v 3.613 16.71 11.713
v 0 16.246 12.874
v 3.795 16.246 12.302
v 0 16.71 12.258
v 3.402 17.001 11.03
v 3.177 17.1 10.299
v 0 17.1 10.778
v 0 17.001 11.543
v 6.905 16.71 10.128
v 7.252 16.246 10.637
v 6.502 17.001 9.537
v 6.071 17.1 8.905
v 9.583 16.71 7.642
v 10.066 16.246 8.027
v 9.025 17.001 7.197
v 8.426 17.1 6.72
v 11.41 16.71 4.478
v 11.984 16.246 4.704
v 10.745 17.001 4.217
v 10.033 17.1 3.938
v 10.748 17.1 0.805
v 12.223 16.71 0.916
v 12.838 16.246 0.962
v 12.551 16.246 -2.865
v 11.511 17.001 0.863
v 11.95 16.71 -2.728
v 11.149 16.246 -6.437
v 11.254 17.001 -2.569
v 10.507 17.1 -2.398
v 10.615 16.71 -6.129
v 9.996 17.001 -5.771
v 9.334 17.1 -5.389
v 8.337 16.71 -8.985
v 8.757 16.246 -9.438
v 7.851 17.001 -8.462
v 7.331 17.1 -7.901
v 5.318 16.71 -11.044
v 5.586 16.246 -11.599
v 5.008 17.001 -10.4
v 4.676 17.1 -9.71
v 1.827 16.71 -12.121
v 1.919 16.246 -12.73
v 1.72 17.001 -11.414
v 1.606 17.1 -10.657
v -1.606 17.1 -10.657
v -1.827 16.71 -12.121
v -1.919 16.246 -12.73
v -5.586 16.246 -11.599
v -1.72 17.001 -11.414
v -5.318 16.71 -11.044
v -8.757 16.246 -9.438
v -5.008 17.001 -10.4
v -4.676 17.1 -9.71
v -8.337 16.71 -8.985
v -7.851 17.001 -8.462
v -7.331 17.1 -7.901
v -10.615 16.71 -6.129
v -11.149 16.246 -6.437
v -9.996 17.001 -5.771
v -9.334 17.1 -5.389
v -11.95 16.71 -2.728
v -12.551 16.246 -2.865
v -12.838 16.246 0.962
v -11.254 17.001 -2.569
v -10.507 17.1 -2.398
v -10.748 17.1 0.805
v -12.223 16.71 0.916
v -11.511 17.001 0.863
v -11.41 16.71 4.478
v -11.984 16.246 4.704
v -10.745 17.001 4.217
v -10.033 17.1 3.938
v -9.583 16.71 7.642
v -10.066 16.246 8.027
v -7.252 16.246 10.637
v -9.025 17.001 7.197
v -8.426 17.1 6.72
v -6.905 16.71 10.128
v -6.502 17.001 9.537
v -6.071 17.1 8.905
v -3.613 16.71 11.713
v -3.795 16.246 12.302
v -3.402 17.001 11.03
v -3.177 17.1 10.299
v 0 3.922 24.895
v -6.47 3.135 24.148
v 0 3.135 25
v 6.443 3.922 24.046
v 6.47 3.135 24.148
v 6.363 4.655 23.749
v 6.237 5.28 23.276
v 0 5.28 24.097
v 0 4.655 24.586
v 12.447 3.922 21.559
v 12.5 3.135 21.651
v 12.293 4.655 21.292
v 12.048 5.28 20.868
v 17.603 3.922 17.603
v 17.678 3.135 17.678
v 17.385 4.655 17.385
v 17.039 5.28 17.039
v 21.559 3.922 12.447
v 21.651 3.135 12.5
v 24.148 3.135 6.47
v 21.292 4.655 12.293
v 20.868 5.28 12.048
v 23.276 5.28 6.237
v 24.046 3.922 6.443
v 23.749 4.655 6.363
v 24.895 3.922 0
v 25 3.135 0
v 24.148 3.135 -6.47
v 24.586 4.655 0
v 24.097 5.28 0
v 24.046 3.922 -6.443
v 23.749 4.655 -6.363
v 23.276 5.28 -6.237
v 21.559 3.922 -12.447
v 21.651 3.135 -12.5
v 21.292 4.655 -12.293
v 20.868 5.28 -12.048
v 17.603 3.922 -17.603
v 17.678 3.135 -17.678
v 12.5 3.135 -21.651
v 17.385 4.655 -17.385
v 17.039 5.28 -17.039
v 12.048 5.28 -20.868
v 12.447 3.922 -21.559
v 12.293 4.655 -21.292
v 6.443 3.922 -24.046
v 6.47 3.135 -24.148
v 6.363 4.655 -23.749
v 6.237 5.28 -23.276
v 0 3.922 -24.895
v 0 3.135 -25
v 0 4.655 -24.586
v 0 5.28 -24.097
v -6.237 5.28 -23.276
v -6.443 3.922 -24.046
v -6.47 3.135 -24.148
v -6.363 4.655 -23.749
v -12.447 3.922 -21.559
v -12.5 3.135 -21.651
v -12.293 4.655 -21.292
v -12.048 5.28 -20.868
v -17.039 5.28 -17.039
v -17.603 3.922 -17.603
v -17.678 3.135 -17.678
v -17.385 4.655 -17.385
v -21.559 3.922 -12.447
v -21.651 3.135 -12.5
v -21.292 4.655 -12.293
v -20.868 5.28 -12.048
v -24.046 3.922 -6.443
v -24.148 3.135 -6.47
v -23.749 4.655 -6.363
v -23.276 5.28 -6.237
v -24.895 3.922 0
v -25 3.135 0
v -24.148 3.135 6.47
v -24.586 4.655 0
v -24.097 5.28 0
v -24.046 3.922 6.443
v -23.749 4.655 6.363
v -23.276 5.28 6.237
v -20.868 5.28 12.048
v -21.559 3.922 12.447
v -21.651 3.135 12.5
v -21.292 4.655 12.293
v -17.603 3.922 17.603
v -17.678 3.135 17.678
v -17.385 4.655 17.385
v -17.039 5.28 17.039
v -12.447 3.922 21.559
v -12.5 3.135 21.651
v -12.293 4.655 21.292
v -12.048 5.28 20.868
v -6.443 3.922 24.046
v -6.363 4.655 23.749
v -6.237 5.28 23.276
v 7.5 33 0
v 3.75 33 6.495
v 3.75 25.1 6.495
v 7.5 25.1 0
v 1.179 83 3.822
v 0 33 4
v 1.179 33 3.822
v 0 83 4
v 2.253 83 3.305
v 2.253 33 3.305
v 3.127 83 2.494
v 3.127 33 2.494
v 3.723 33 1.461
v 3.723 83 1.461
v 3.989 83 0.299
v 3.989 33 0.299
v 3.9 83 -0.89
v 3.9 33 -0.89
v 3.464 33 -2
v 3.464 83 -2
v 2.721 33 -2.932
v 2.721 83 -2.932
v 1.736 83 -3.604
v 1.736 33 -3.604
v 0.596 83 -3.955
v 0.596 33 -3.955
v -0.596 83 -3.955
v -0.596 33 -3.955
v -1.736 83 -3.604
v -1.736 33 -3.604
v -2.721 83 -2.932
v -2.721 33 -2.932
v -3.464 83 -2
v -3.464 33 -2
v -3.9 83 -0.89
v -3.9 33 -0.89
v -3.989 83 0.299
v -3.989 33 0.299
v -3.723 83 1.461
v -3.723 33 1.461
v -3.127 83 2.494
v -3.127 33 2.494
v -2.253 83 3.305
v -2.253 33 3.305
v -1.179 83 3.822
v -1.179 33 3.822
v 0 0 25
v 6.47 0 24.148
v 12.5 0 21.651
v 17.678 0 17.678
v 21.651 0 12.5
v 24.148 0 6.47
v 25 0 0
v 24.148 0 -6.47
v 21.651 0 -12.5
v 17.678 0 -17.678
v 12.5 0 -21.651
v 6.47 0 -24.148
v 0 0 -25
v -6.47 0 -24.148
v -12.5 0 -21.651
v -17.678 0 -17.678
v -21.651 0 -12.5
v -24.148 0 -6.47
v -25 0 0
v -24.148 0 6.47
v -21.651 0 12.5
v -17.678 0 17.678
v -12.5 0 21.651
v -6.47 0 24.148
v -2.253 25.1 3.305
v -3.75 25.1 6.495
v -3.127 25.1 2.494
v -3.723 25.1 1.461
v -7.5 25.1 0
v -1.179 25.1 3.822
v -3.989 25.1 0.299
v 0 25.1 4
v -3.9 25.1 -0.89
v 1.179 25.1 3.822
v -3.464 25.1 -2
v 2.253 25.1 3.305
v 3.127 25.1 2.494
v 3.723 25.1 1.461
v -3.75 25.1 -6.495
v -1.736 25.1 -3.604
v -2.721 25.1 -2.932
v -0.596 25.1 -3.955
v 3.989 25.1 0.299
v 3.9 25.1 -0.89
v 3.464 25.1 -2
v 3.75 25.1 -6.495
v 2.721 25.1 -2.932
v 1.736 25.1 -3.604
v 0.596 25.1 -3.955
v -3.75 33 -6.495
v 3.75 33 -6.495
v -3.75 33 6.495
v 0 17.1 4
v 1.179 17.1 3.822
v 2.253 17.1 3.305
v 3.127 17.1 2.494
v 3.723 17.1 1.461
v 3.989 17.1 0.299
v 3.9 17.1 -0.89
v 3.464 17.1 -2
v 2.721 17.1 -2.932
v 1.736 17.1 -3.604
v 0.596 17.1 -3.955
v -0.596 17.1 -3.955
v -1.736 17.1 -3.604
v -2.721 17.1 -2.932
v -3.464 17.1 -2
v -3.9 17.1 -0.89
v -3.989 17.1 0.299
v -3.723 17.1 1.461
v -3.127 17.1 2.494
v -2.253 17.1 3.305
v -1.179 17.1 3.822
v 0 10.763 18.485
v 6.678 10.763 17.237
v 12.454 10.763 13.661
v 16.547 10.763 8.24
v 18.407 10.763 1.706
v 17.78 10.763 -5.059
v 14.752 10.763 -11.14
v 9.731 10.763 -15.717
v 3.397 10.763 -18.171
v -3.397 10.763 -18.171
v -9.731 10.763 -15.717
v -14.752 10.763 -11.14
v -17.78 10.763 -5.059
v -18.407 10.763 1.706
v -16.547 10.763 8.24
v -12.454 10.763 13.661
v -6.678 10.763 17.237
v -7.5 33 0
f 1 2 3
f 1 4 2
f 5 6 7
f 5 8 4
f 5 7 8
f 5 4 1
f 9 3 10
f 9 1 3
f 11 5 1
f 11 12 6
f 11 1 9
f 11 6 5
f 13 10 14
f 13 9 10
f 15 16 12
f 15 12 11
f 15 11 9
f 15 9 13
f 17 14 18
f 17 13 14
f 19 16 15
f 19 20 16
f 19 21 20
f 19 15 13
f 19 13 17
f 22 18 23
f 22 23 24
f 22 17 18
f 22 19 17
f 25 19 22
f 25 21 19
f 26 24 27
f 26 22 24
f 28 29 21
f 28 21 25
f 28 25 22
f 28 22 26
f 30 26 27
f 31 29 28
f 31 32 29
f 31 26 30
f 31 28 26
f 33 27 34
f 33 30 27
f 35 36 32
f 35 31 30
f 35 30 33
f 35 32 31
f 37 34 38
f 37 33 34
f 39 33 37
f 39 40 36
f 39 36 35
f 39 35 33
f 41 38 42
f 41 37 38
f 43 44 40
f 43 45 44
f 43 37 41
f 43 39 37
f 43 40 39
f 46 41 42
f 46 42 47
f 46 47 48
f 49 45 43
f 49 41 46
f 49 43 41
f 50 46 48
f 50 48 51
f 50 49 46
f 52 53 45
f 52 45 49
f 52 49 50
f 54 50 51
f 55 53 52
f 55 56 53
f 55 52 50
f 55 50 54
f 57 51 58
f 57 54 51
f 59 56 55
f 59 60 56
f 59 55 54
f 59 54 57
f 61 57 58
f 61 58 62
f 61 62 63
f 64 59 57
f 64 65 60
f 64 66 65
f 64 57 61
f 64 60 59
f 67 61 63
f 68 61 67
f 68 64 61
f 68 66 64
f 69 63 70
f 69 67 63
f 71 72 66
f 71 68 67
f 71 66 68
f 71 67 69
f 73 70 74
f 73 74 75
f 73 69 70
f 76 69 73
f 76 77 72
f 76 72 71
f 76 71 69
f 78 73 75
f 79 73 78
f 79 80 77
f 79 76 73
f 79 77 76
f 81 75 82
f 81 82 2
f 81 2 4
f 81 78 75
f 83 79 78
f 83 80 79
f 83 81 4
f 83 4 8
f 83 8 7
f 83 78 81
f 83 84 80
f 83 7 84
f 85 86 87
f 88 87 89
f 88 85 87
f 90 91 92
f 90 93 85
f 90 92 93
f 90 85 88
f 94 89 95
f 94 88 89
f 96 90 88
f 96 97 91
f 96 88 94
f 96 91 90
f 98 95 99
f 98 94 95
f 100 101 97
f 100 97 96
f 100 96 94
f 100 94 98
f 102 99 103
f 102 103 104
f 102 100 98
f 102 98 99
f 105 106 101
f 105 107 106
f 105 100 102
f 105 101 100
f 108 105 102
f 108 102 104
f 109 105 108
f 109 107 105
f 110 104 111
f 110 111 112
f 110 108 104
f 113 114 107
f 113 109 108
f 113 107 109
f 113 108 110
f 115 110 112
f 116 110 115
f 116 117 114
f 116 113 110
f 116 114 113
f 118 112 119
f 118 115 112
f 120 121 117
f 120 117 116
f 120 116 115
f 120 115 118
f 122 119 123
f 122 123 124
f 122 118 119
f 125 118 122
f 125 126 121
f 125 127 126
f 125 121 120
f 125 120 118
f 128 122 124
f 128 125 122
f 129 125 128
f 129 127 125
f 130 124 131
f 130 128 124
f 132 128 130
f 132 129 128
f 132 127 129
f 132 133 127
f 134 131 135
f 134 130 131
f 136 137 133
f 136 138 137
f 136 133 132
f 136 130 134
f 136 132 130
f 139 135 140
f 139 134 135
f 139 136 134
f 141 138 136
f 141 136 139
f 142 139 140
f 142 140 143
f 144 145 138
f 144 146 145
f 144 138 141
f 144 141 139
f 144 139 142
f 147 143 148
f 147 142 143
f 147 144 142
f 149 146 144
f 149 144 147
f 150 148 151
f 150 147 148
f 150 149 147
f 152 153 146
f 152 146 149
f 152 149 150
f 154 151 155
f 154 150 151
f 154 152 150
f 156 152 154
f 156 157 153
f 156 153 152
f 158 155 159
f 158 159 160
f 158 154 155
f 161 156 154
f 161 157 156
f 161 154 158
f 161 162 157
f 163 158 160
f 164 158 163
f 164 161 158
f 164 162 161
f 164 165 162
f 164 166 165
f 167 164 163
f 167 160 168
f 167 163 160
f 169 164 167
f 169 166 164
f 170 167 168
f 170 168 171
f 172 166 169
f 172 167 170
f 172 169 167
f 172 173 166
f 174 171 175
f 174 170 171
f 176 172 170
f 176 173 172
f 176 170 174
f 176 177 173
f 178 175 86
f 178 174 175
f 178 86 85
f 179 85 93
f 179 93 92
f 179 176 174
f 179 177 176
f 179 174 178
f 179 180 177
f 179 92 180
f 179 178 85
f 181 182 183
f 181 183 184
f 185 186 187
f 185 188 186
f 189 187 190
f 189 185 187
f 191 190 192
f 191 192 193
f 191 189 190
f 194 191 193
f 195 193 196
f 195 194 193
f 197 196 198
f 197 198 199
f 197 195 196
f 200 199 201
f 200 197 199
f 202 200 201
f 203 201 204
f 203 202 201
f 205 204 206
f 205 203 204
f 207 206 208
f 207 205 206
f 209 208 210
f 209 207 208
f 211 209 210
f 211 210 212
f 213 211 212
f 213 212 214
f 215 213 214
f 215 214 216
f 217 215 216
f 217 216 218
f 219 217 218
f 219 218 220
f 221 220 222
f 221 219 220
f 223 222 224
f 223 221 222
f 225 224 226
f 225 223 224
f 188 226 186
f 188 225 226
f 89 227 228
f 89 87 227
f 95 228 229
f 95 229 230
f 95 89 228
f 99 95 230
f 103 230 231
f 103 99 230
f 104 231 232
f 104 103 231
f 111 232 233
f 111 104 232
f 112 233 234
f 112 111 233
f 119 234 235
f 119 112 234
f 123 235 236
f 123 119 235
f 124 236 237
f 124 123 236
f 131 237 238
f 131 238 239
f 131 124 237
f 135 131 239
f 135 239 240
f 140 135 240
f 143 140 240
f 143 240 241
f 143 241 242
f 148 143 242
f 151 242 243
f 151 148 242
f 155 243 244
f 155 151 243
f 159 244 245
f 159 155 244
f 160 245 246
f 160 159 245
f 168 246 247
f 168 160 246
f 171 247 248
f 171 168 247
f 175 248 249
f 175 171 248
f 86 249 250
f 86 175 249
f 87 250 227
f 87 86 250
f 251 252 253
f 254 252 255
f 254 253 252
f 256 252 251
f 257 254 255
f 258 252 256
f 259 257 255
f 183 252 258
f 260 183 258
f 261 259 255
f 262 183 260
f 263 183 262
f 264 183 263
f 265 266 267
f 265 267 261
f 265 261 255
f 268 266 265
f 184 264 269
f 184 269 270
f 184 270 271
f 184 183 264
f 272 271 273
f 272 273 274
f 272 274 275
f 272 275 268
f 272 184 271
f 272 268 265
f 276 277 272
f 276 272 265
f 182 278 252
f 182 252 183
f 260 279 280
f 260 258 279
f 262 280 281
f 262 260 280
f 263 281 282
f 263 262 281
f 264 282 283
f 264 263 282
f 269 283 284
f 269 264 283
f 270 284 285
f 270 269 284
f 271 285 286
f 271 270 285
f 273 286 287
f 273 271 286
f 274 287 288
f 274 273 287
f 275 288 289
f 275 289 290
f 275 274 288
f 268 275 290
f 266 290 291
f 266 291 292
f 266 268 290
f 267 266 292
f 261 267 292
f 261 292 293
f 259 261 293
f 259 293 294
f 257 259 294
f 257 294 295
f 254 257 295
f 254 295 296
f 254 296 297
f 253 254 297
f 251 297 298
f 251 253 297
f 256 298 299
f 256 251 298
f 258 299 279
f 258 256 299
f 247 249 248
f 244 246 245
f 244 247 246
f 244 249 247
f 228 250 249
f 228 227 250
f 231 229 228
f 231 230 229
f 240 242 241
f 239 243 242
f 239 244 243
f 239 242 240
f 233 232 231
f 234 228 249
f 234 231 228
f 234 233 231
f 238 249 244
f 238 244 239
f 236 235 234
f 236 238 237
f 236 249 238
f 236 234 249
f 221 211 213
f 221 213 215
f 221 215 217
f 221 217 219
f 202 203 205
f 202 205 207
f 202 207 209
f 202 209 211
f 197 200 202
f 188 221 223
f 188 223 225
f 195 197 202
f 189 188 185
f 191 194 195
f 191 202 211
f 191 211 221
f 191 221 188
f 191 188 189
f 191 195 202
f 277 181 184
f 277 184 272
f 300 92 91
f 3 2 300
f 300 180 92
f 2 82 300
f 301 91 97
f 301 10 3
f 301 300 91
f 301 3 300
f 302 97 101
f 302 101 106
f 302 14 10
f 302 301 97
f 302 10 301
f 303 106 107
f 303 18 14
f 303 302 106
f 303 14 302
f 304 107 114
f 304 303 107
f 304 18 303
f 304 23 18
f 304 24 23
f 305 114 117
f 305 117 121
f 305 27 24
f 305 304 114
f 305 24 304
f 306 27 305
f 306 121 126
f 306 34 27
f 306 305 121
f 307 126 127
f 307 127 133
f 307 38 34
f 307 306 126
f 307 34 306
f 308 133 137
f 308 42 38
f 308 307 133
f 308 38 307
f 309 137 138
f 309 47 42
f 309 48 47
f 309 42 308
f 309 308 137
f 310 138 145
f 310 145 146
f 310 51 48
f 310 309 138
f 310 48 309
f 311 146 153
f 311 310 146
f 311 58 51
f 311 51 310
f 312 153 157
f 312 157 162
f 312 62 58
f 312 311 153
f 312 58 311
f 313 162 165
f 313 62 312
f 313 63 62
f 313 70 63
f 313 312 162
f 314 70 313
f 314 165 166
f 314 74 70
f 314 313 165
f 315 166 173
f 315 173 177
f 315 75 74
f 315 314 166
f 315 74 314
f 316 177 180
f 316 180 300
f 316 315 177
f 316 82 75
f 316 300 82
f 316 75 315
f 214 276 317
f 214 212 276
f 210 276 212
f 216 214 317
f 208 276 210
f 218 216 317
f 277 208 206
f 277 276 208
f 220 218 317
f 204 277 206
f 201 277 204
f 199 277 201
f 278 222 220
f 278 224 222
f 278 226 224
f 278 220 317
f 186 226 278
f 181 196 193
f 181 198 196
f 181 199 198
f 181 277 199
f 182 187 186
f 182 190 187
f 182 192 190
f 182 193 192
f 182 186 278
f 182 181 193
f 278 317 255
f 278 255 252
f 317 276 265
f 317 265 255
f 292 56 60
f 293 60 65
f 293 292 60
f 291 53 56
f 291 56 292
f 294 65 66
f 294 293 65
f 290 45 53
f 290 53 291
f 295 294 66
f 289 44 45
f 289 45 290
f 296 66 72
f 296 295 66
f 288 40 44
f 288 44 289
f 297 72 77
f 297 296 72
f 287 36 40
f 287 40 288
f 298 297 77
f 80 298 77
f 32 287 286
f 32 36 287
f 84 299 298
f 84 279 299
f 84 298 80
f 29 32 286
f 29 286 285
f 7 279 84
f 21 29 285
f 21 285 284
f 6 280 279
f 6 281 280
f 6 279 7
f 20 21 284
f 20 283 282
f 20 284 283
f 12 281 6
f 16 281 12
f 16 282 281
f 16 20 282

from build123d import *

# Parameters (mm, degrees)
SKETCH_3_R          = 11.768421734
CUT_EXTRUDE_1_DEPTH = 10


with BuildPart() as part:
    # 草图1 → 旋转1 (revolve)
    with BuildSketch(Plane.XY, mode=Mode.PRIVATE) as revolve_1_sk:
        with BuildLine():
            Line((0, 0), (25, 0))
            Line((25, 0), (25, 3.134686744))
            ThreePointArc((25, 3.134686744), (24.76494299, 4.298770187), (24.096606492, 5.280436315))
            Line((24.096606492, 5.280436315), (12.874273498, 16.24574957))
            ThreePointArc((12.874273498, 16.24574957), (11.909645648, 16.878241234), (10.777667007, 17.1))
            Line((10.777667007, 17.1), (4, 17.1))
            Line((4, 17.1), (4, 25.1))
            Line((4, 25.1), (7.5, 25.1))
            Line((7.5, 25.1), (7.5, 33))
            Line((7.5, 33), (4, 33))
            Line((4, 33), (4, 83))
            Line((4, 83), (0, 83))
            Line((0, 83), (0, 0))
        make_face()
    revolve(revolve_1_sk.sketch.rotate(Axis((0, 83, 0), (0, 1, 0)), 270), axis=Axis((0, 83, 0), (0, 1, 0)))

    # 草图3 → 切除-拉伸1 (cut)
    with BuildSketch(Plane(origin=(0, 33, 0), x_dir=(1, 0, 0), z_dir=(0, 1, 0))):
        Circle(SKETCH_3_R)
        Polygon((7.5, 0), (3.75, 6.495190528), (-3.75, 6.495190528), (-7.5, 0), (-3.75, -6.495190528), (3.75, -6.495190528), align=None, mode=Mode.SUBTRACT)
    extrude(amount=-CUT_EXTRUDE_1_DEPTH, mode=Mode.SUBTRACT)


solid = part.part
